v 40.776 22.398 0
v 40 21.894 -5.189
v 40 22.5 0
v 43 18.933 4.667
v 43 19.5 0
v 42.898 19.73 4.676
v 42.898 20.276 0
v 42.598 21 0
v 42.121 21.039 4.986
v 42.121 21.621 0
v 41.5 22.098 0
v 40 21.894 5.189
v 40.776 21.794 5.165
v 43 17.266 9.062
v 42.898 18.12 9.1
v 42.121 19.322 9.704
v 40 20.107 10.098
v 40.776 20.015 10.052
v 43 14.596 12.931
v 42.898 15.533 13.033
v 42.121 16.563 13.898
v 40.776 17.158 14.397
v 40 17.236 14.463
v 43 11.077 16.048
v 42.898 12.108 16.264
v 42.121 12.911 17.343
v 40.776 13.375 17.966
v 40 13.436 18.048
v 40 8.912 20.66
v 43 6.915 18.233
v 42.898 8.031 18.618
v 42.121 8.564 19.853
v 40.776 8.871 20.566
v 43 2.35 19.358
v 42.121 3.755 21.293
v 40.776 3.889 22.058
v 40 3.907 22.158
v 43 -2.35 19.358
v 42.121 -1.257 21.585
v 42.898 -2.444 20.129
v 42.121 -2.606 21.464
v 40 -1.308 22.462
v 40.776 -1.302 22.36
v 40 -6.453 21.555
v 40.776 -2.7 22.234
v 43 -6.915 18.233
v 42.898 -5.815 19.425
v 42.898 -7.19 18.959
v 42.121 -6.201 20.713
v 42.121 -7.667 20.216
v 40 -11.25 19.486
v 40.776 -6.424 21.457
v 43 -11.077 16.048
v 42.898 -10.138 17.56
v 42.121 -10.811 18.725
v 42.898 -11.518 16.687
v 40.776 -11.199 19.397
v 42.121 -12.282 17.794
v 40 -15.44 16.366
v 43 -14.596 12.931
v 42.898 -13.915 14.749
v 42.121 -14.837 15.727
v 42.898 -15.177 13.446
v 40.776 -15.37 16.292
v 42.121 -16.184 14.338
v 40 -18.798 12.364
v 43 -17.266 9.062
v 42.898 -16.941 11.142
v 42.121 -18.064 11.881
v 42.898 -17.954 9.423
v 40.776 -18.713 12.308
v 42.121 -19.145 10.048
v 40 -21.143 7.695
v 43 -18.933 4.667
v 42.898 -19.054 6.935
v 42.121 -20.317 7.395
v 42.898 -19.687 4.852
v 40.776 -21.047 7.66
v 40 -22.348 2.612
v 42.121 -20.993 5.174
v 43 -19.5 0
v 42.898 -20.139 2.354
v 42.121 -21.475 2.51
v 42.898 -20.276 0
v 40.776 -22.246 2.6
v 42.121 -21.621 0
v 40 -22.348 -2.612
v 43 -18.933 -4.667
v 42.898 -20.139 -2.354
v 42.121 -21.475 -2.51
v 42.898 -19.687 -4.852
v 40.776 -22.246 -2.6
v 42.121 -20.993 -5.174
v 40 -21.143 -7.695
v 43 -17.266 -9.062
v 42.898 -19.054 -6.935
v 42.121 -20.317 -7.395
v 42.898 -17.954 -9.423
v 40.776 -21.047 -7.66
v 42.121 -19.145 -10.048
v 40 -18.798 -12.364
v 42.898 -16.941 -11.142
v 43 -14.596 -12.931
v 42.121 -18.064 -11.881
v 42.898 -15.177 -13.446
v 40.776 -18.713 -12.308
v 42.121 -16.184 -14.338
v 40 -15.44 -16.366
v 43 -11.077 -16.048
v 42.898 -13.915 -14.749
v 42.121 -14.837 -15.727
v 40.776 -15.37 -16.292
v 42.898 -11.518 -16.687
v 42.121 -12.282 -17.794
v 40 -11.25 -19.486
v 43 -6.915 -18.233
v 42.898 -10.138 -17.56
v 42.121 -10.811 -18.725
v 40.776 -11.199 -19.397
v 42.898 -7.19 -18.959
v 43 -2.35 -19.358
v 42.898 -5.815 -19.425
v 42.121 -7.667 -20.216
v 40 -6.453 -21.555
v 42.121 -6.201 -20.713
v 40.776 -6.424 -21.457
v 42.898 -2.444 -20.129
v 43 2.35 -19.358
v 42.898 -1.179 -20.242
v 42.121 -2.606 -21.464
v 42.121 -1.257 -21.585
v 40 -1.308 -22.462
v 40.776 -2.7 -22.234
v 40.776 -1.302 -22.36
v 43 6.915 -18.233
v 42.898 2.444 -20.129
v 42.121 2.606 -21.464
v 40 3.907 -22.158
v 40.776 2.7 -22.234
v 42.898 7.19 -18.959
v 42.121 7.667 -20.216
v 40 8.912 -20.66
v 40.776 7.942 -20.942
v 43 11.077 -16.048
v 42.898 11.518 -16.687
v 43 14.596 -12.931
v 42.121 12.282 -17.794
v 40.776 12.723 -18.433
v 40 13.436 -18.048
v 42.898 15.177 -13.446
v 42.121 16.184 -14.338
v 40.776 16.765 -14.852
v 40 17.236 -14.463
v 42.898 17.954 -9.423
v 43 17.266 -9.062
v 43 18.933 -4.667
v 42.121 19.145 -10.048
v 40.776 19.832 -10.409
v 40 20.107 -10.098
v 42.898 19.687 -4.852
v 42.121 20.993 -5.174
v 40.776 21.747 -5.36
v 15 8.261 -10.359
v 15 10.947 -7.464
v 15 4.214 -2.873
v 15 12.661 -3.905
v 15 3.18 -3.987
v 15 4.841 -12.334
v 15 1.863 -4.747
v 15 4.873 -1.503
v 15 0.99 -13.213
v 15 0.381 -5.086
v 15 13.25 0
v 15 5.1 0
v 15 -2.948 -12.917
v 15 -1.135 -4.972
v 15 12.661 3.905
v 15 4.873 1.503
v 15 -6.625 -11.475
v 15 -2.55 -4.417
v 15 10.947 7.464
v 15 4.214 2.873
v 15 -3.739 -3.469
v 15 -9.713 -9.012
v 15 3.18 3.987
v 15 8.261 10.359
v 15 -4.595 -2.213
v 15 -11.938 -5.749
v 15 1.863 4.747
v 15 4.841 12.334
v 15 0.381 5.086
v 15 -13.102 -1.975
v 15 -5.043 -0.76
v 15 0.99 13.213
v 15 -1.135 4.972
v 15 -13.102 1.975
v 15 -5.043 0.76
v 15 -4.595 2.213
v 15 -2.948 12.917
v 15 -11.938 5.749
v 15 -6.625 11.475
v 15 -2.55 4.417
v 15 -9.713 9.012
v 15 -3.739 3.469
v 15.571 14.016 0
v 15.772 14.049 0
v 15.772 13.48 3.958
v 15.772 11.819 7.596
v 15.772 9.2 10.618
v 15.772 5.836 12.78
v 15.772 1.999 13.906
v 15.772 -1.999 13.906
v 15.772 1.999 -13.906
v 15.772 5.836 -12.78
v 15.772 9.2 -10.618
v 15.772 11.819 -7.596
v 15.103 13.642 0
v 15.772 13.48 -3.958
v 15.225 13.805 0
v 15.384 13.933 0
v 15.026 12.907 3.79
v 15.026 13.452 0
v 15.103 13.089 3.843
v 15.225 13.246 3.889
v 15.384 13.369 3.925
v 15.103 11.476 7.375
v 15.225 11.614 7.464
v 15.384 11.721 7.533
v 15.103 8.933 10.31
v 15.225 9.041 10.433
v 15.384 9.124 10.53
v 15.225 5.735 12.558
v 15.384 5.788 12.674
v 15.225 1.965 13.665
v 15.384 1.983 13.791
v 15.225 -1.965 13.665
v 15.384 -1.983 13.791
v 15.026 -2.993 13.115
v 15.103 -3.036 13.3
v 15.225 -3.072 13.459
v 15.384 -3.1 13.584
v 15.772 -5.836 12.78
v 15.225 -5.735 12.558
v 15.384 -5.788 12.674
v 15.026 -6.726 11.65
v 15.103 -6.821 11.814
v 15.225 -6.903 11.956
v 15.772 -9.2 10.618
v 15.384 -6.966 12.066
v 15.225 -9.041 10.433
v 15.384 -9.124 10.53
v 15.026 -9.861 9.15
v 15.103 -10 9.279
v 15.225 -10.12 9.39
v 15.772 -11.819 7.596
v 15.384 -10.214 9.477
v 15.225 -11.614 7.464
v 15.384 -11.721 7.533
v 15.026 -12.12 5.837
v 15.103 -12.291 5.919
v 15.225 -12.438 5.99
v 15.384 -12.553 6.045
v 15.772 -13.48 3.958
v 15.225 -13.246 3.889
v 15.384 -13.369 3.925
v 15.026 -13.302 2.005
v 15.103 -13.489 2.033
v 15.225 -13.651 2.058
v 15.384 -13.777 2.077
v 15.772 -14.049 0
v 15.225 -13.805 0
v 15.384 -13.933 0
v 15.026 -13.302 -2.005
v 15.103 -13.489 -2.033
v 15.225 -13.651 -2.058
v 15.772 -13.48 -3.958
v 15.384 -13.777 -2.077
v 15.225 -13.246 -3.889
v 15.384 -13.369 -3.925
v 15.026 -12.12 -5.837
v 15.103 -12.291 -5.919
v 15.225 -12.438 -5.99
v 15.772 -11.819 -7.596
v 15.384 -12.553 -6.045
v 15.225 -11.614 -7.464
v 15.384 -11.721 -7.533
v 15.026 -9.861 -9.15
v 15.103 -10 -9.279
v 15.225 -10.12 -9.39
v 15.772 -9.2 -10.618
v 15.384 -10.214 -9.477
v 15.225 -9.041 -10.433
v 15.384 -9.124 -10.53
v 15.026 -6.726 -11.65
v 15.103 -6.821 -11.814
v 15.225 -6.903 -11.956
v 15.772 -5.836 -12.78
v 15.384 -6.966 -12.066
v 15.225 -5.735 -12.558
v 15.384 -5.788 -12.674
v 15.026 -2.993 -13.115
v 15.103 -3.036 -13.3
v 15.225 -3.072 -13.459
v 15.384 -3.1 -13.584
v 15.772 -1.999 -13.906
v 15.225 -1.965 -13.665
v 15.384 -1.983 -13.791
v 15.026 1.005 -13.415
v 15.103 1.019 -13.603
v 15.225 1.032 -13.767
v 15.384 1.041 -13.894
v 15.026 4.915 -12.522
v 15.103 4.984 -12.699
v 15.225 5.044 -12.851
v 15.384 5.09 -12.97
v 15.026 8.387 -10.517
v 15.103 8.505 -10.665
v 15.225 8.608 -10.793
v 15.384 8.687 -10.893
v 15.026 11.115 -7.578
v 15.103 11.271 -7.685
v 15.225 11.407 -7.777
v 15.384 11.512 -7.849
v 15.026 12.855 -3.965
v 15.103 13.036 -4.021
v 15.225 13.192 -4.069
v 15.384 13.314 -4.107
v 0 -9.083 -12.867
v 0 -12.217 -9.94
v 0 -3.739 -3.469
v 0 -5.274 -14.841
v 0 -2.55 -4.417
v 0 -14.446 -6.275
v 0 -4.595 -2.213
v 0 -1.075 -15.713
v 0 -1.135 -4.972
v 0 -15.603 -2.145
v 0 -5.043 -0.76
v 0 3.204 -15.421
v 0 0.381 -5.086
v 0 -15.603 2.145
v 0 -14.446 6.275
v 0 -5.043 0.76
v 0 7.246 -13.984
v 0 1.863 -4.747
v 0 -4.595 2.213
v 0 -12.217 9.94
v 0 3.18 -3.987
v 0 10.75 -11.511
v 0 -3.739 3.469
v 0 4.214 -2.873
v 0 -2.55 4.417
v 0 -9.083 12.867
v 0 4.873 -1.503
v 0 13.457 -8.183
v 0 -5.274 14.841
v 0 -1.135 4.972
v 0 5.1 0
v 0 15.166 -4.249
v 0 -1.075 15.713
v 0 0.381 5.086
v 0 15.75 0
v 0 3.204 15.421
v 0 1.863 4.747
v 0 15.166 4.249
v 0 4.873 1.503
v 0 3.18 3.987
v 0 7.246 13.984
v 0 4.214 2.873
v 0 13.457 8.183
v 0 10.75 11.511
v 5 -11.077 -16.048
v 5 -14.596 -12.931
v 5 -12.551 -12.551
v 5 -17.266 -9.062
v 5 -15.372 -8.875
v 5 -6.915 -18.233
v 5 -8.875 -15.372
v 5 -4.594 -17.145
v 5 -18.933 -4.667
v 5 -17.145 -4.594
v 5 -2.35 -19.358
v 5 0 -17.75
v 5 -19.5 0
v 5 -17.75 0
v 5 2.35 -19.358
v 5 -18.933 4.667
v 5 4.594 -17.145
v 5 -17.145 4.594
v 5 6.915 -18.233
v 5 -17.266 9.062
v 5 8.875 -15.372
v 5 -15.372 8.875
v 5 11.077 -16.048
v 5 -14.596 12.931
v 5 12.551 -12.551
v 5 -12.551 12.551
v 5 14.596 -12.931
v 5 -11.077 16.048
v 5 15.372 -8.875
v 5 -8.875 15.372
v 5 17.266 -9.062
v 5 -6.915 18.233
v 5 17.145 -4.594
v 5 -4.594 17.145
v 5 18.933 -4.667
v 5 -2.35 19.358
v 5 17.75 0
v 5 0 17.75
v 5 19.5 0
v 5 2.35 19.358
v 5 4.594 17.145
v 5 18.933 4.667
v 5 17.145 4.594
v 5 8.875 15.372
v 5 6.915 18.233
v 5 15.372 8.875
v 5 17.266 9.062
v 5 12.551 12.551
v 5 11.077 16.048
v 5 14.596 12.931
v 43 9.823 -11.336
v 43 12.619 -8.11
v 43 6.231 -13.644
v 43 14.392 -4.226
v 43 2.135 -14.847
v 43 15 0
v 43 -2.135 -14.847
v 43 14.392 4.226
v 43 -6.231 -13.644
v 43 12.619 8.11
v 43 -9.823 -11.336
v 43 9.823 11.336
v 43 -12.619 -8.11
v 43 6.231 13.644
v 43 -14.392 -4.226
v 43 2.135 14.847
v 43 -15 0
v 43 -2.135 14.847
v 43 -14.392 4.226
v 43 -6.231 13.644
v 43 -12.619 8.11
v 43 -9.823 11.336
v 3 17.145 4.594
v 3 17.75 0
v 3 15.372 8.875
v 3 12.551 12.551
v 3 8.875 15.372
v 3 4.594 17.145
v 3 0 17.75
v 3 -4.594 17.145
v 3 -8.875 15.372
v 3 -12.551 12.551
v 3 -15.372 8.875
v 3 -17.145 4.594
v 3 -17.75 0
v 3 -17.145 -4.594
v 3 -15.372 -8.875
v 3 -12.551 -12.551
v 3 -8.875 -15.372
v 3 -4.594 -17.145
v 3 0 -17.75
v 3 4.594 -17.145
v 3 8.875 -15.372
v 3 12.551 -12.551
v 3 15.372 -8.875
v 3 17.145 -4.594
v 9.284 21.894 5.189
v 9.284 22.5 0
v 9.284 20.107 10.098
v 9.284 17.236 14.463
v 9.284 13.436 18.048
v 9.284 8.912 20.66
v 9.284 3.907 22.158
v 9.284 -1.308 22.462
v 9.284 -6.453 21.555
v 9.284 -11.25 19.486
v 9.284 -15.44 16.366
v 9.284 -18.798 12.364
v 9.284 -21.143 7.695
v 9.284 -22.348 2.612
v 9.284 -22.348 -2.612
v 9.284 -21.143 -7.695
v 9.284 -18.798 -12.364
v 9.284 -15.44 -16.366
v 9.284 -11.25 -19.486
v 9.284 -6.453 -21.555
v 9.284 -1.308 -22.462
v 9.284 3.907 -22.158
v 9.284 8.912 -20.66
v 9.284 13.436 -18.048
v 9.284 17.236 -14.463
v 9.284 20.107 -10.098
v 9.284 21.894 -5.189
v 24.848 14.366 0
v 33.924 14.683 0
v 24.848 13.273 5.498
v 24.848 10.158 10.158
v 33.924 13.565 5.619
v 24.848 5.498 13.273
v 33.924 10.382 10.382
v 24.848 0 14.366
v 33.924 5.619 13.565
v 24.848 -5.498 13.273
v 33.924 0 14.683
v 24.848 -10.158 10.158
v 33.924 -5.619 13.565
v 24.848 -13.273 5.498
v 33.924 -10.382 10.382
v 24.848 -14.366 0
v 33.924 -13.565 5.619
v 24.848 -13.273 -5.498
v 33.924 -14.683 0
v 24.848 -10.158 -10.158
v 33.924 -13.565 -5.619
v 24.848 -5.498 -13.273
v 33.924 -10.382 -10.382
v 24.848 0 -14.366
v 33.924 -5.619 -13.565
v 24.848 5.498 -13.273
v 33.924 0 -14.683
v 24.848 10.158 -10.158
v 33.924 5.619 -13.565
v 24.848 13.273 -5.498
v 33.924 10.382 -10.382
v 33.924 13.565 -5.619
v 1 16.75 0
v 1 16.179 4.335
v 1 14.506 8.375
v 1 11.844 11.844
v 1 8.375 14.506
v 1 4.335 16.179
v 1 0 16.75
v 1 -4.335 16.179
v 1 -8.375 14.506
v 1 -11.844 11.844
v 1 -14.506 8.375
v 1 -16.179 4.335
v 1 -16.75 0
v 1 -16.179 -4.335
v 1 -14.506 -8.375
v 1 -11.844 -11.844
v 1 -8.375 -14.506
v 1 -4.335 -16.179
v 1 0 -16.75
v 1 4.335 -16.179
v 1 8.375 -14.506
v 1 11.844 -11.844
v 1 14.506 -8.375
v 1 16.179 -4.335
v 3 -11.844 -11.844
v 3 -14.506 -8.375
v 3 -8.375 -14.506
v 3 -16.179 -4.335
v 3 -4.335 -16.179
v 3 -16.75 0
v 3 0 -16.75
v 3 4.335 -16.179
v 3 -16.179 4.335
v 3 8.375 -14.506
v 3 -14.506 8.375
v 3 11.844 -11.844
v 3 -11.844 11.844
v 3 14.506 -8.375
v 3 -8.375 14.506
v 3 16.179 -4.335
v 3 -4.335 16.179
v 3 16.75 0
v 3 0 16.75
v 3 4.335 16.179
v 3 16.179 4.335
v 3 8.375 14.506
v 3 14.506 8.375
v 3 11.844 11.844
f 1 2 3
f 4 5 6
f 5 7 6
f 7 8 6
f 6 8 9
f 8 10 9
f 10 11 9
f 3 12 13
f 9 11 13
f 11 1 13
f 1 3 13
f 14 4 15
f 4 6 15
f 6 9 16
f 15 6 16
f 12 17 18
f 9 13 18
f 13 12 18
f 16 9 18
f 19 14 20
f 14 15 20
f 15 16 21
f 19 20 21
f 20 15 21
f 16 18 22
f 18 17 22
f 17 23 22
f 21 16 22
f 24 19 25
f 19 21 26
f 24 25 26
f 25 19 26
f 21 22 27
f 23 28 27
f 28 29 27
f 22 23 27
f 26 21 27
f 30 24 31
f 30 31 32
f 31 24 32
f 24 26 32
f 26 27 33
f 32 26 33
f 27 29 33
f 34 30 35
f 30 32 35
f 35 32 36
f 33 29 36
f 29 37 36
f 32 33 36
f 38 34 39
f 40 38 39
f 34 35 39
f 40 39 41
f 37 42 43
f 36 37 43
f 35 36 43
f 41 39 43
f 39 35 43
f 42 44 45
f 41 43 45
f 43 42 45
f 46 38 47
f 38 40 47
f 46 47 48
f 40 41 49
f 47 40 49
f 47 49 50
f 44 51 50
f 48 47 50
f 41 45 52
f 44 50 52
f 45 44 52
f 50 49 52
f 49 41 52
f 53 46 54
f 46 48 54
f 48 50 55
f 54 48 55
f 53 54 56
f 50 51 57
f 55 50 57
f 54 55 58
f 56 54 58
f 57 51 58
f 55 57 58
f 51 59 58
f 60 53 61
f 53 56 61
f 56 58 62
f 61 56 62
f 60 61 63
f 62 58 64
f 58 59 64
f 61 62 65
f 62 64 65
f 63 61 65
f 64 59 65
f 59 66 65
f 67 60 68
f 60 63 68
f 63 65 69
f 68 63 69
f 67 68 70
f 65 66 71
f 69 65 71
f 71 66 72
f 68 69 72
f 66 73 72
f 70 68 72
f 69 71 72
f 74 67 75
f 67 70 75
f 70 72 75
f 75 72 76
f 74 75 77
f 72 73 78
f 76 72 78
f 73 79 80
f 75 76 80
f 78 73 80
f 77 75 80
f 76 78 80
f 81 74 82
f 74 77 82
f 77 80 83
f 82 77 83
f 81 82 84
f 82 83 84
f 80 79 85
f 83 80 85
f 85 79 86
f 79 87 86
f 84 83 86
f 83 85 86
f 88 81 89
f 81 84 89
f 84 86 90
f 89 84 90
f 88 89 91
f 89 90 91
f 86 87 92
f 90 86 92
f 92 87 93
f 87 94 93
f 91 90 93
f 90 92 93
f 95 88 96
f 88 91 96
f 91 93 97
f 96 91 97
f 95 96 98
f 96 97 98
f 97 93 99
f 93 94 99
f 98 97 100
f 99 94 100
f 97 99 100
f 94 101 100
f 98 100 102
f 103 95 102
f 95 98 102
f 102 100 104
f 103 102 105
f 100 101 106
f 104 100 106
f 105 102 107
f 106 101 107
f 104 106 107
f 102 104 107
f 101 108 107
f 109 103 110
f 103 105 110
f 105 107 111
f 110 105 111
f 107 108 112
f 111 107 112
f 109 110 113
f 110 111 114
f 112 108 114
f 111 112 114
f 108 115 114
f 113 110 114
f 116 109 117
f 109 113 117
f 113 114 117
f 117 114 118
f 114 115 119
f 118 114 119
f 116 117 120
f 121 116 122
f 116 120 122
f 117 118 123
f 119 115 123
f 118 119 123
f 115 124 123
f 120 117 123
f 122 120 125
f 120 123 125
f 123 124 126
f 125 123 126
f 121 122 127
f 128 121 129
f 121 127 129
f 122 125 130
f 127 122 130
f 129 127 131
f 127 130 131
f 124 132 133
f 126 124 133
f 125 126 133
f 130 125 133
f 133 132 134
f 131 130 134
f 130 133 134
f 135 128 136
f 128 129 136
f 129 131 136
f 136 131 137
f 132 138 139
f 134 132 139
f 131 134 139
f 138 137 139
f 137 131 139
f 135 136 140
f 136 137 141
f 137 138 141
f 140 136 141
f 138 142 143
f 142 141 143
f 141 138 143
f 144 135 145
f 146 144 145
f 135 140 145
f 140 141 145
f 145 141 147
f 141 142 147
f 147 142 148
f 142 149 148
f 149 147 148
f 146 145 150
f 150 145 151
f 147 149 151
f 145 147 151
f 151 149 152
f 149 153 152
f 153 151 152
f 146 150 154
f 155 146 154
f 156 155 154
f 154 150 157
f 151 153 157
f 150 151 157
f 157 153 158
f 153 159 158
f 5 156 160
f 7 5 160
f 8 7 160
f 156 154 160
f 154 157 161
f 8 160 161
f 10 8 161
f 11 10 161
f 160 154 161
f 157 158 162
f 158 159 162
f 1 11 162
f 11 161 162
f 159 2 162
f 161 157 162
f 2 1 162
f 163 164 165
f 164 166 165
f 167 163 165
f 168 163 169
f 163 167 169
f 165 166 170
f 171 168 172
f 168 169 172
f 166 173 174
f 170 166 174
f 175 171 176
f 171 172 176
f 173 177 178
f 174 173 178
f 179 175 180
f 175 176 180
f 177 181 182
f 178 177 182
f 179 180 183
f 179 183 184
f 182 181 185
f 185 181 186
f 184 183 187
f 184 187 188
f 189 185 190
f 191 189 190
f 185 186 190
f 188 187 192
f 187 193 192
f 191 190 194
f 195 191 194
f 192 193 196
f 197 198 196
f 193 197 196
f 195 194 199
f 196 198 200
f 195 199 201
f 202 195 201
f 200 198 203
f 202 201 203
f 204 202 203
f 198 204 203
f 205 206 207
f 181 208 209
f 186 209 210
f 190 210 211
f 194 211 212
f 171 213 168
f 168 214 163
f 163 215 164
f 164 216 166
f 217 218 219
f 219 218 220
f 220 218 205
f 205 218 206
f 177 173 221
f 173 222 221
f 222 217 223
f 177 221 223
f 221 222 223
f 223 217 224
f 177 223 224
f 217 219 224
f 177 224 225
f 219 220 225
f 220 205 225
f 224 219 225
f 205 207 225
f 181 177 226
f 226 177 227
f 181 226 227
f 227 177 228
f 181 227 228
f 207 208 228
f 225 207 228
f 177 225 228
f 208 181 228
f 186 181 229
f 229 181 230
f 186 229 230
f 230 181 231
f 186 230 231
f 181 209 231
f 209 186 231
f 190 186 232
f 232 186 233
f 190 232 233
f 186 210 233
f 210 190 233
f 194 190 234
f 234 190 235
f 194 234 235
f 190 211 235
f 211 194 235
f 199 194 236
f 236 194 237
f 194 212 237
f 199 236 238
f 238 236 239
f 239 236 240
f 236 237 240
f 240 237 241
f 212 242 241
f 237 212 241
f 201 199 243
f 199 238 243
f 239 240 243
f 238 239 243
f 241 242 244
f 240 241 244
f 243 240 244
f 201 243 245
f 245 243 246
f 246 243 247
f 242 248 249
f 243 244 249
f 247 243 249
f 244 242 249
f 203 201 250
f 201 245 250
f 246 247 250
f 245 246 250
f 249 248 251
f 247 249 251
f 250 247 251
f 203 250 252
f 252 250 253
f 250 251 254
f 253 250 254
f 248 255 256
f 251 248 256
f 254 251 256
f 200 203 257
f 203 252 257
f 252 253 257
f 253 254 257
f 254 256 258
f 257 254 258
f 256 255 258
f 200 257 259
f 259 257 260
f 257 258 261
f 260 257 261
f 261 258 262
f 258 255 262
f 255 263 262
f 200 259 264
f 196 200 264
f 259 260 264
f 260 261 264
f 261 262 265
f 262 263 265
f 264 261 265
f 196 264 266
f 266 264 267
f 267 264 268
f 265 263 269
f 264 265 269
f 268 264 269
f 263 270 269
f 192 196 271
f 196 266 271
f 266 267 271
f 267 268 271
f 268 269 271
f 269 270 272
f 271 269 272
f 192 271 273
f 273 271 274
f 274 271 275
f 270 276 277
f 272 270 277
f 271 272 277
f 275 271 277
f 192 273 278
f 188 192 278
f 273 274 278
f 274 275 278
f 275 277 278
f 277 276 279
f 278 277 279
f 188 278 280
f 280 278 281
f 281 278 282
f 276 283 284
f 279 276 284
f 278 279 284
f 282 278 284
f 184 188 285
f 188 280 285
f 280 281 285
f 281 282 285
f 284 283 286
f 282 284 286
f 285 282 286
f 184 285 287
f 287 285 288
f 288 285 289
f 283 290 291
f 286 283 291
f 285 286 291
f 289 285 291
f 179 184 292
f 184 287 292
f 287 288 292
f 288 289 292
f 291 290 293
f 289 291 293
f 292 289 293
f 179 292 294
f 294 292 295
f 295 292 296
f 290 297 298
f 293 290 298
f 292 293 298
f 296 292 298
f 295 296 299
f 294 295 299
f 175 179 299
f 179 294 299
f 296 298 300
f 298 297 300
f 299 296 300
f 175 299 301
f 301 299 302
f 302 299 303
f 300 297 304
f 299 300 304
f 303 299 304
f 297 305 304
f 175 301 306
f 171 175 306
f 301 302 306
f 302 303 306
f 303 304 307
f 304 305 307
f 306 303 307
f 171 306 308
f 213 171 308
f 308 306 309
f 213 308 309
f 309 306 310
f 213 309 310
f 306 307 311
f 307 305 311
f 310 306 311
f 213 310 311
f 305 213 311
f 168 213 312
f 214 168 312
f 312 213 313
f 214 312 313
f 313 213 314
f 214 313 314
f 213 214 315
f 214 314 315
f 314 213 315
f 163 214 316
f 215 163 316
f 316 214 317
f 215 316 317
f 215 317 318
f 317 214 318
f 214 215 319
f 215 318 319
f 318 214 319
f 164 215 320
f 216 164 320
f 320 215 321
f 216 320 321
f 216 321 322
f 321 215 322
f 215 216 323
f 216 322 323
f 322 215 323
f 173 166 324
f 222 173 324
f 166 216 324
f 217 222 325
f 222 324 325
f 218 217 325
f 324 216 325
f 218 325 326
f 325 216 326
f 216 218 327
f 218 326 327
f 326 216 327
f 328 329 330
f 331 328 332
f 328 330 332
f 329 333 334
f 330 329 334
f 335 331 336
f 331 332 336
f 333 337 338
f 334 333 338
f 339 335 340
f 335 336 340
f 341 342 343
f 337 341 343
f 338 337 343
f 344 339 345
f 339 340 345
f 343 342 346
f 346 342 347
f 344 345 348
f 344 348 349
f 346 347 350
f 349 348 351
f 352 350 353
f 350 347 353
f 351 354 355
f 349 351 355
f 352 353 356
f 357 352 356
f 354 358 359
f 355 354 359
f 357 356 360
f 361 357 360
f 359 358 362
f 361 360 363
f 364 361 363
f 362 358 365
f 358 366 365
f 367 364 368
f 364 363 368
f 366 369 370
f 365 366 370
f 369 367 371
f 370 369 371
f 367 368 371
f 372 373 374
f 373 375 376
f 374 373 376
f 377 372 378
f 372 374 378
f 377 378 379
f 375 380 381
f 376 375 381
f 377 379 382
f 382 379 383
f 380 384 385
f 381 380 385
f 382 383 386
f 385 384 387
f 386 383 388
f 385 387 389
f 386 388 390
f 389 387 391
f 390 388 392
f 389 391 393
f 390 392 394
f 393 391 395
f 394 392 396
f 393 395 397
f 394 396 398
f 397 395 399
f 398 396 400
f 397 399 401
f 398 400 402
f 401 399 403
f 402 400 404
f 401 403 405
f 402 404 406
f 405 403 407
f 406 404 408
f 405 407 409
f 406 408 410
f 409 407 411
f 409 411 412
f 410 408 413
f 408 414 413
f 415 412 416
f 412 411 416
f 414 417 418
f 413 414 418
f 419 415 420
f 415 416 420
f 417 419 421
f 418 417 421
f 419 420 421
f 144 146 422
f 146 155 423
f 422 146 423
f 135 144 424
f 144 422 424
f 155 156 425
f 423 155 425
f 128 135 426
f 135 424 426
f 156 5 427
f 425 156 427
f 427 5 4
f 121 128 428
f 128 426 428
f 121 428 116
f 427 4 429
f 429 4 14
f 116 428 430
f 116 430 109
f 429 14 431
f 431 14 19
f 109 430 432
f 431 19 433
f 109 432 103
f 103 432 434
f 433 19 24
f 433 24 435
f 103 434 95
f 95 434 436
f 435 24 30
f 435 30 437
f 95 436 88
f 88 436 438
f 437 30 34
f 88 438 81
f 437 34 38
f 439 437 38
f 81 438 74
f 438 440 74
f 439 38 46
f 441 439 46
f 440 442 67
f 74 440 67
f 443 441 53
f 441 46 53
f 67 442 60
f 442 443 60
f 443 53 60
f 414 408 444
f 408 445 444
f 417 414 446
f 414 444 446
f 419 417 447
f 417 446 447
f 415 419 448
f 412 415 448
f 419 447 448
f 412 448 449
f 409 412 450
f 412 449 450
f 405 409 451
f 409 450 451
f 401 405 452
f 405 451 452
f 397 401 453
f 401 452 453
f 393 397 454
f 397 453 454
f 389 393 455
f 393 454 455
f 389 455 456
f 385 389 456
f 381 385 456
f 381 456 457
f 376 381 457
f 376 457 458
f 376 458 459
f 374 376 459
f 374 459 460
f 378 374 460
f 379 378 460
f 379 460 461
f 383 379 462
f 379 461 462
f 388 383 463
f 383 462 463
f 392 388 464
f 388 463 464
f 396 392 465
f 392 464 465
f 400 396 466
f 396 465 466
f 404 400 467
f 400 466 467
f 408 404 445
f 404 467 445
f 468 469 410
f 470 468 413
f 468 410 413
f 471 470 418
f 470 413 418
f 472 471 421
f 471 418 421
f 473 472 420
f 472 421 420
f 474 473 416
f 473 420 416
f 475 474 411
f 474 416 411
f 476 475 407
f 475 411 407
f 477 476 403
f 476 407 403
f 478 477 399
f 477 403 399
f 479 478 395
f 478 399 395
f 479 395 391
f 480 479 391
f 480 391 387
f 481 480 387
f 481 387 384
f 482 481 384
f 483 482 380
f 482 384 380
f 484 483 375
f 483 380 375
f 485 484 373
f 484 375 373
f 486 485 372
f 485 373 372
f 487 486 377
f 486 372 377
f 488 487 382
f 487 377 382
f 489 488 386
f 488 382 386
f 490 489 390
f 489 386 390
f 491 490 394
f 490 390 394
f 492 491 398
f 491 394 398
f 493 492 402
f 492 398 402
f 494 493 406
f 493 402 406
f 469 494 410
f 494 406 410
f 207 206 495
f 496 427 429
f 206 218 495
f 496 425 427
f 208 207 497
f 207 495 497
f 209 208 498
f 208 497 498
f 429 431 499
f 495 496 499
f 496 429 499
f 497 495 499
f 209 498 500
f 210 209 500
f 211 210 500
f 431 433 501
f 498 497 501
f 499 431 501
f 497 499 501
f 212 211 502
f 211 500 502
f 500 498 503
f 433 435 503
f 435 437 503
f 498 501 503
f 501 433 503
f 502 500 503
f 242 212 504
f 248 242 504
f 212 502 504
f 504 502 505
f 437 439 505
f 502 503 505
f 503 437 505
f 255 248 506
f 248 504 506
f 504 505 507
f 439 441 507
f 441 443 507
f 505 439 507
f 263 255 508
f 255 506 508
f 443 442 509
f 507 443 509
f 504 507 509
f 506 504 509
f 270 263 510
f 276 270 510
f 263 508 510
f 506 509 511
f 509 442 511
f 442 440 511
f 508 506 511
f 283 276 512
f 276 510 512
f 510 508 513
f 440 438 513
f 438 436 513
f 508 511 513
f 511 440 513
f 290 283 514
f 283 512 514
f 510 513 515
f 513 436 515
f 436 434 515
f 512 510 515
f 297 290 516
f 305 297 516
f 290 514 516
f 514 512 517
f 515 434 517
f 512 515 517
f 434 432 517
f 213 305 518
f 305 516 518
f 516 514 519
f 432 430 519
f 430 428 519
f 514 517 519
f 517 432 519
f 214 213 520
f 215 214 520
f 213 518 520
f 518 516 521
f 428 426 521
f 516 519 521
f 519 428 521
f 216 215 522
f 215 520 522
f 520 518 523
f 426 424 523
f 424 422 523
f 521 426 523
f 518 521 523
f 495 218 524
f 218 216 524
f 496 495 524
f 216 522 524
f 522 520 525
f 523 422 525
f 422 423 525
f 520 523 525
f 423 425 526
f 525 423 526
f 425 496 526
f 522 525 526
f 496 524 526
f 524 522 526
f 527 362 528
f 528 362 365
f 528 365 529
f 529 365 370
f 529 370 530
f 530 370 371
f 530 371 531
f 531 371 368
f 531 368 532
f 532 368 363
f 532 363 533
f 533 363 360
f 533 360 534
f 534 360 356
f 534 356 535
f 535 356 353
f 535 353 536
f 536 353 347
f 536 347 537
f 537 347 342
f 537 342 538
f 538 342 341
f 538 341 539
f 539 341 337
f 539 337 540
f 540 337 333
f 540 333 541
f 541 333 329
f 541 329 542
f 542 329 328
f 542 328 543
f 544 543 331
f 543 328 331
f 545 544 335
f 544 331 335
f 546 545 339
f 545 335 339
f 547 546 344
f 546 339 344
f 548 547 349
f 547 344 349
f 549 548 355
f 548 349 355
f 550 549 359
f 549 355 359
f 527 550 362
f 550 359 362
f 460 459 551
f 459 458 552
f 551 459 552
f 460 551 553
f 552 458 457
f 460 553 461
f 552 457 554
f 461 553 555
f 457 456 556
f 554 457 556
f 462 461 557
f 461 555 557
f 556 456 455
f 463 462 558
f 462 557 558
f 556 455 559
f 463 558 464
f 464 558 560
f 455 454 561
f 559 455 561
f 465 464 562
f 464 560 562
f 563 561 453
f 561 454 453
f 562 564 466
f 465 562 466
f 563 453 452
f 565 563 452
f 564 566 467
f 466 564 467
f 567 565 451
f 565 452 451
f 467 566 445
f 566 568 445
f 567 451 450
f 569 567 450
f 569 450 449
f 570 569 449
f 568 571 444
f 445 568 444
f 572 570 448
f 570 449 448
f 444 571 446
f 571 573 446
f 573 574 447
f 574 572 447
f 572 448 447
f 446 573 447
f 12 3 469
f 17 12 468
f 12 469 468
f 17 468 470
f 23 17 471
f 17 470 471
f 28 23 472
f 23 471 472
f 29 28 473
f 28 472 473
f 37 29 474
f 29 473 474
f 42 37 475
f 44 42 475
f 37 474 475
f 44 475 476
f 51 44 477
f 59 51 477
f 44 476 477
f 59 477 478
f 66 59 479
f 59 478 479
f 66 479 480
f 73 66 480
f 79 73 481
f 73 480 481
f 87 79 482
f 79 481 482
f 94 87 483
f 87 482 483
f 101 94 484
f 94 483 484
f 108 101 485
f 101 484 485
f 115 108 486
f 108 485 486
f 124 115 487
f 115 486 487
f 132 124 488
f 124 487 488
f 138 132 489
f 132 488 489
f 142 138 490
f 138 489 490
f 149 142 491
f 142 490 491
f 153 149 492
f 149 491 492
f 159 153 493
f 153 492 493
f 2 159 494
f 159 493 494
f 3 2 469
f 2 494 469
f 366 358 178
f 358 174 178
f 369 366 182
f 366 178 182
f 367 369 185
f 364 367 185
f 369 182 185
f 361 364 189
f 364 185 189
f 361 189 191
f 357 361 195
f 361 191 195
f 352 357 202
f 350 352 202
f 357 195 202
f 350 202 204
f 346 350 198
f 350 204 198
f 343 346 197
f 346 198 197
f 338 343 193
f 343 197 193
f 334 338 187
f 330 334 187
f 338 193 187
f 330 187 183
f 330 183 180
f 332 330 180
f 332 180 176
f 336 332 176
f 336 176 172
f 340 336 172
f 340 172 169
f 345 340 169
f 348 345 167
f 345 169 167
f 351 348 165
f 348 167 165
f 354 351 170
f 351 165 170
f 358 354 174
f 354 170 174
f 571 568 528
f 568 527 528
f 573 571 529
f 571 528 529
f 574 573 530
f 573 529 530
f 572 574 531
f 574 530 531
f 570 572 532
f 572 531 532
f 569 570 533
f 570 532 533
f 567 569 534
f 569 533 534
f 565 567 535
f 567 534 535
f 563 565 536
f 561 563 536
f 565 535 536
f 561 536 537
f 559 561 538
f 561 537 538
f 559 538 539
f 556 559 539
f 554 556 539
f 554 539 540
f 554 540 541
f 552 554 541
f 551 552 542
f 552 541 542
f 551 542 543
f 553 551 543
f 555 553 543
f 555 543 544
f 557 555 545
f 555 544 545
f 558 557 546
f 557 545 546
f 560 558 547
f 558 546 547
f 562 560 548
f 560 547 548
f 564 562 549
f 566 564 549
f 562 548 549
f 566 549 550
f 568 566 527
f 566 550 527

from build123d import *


with BuildPart() as part:
    # Sketch1 → Revolve1 (revolve)
    with BuildSketch(Plane.XY):
        with BuildLine():
            Line((1, 16.75), (0, 15.75))
            Line((0, 15.75), (0, 5.1))
            Line((0, 5.1), (15, 5.1))
            Line((15, 5.1), (15, 13.249667434))
            ThreePointArc((15, 13.249667434), (15.22452816, 13.805394131), (15.772080403, 14.049180096))
            Line((15.772080403, 14.049180096), (43, 15))
            Line((43, 15), (43, 19.5))
            ThreePointArc((43, 19.5), (42.121320344, 21.621320344), (40, 22.5))
            Line((40, 22.5), (9.28444402, 22.5))
            Line((9.28444402, 22.5), (5, 19.5))
            Line((5, 19.5), (5, 17.75))
            Line((5, 17.75), (3, 17.75))
            Line((3, 17.75), (3, 16.75))
            Line((3, 16.75), (1, 16.75))
        make_face()
    revolve(axis=Axis((0, 0, 0), (1, 0, 0)))


solid = part.part
